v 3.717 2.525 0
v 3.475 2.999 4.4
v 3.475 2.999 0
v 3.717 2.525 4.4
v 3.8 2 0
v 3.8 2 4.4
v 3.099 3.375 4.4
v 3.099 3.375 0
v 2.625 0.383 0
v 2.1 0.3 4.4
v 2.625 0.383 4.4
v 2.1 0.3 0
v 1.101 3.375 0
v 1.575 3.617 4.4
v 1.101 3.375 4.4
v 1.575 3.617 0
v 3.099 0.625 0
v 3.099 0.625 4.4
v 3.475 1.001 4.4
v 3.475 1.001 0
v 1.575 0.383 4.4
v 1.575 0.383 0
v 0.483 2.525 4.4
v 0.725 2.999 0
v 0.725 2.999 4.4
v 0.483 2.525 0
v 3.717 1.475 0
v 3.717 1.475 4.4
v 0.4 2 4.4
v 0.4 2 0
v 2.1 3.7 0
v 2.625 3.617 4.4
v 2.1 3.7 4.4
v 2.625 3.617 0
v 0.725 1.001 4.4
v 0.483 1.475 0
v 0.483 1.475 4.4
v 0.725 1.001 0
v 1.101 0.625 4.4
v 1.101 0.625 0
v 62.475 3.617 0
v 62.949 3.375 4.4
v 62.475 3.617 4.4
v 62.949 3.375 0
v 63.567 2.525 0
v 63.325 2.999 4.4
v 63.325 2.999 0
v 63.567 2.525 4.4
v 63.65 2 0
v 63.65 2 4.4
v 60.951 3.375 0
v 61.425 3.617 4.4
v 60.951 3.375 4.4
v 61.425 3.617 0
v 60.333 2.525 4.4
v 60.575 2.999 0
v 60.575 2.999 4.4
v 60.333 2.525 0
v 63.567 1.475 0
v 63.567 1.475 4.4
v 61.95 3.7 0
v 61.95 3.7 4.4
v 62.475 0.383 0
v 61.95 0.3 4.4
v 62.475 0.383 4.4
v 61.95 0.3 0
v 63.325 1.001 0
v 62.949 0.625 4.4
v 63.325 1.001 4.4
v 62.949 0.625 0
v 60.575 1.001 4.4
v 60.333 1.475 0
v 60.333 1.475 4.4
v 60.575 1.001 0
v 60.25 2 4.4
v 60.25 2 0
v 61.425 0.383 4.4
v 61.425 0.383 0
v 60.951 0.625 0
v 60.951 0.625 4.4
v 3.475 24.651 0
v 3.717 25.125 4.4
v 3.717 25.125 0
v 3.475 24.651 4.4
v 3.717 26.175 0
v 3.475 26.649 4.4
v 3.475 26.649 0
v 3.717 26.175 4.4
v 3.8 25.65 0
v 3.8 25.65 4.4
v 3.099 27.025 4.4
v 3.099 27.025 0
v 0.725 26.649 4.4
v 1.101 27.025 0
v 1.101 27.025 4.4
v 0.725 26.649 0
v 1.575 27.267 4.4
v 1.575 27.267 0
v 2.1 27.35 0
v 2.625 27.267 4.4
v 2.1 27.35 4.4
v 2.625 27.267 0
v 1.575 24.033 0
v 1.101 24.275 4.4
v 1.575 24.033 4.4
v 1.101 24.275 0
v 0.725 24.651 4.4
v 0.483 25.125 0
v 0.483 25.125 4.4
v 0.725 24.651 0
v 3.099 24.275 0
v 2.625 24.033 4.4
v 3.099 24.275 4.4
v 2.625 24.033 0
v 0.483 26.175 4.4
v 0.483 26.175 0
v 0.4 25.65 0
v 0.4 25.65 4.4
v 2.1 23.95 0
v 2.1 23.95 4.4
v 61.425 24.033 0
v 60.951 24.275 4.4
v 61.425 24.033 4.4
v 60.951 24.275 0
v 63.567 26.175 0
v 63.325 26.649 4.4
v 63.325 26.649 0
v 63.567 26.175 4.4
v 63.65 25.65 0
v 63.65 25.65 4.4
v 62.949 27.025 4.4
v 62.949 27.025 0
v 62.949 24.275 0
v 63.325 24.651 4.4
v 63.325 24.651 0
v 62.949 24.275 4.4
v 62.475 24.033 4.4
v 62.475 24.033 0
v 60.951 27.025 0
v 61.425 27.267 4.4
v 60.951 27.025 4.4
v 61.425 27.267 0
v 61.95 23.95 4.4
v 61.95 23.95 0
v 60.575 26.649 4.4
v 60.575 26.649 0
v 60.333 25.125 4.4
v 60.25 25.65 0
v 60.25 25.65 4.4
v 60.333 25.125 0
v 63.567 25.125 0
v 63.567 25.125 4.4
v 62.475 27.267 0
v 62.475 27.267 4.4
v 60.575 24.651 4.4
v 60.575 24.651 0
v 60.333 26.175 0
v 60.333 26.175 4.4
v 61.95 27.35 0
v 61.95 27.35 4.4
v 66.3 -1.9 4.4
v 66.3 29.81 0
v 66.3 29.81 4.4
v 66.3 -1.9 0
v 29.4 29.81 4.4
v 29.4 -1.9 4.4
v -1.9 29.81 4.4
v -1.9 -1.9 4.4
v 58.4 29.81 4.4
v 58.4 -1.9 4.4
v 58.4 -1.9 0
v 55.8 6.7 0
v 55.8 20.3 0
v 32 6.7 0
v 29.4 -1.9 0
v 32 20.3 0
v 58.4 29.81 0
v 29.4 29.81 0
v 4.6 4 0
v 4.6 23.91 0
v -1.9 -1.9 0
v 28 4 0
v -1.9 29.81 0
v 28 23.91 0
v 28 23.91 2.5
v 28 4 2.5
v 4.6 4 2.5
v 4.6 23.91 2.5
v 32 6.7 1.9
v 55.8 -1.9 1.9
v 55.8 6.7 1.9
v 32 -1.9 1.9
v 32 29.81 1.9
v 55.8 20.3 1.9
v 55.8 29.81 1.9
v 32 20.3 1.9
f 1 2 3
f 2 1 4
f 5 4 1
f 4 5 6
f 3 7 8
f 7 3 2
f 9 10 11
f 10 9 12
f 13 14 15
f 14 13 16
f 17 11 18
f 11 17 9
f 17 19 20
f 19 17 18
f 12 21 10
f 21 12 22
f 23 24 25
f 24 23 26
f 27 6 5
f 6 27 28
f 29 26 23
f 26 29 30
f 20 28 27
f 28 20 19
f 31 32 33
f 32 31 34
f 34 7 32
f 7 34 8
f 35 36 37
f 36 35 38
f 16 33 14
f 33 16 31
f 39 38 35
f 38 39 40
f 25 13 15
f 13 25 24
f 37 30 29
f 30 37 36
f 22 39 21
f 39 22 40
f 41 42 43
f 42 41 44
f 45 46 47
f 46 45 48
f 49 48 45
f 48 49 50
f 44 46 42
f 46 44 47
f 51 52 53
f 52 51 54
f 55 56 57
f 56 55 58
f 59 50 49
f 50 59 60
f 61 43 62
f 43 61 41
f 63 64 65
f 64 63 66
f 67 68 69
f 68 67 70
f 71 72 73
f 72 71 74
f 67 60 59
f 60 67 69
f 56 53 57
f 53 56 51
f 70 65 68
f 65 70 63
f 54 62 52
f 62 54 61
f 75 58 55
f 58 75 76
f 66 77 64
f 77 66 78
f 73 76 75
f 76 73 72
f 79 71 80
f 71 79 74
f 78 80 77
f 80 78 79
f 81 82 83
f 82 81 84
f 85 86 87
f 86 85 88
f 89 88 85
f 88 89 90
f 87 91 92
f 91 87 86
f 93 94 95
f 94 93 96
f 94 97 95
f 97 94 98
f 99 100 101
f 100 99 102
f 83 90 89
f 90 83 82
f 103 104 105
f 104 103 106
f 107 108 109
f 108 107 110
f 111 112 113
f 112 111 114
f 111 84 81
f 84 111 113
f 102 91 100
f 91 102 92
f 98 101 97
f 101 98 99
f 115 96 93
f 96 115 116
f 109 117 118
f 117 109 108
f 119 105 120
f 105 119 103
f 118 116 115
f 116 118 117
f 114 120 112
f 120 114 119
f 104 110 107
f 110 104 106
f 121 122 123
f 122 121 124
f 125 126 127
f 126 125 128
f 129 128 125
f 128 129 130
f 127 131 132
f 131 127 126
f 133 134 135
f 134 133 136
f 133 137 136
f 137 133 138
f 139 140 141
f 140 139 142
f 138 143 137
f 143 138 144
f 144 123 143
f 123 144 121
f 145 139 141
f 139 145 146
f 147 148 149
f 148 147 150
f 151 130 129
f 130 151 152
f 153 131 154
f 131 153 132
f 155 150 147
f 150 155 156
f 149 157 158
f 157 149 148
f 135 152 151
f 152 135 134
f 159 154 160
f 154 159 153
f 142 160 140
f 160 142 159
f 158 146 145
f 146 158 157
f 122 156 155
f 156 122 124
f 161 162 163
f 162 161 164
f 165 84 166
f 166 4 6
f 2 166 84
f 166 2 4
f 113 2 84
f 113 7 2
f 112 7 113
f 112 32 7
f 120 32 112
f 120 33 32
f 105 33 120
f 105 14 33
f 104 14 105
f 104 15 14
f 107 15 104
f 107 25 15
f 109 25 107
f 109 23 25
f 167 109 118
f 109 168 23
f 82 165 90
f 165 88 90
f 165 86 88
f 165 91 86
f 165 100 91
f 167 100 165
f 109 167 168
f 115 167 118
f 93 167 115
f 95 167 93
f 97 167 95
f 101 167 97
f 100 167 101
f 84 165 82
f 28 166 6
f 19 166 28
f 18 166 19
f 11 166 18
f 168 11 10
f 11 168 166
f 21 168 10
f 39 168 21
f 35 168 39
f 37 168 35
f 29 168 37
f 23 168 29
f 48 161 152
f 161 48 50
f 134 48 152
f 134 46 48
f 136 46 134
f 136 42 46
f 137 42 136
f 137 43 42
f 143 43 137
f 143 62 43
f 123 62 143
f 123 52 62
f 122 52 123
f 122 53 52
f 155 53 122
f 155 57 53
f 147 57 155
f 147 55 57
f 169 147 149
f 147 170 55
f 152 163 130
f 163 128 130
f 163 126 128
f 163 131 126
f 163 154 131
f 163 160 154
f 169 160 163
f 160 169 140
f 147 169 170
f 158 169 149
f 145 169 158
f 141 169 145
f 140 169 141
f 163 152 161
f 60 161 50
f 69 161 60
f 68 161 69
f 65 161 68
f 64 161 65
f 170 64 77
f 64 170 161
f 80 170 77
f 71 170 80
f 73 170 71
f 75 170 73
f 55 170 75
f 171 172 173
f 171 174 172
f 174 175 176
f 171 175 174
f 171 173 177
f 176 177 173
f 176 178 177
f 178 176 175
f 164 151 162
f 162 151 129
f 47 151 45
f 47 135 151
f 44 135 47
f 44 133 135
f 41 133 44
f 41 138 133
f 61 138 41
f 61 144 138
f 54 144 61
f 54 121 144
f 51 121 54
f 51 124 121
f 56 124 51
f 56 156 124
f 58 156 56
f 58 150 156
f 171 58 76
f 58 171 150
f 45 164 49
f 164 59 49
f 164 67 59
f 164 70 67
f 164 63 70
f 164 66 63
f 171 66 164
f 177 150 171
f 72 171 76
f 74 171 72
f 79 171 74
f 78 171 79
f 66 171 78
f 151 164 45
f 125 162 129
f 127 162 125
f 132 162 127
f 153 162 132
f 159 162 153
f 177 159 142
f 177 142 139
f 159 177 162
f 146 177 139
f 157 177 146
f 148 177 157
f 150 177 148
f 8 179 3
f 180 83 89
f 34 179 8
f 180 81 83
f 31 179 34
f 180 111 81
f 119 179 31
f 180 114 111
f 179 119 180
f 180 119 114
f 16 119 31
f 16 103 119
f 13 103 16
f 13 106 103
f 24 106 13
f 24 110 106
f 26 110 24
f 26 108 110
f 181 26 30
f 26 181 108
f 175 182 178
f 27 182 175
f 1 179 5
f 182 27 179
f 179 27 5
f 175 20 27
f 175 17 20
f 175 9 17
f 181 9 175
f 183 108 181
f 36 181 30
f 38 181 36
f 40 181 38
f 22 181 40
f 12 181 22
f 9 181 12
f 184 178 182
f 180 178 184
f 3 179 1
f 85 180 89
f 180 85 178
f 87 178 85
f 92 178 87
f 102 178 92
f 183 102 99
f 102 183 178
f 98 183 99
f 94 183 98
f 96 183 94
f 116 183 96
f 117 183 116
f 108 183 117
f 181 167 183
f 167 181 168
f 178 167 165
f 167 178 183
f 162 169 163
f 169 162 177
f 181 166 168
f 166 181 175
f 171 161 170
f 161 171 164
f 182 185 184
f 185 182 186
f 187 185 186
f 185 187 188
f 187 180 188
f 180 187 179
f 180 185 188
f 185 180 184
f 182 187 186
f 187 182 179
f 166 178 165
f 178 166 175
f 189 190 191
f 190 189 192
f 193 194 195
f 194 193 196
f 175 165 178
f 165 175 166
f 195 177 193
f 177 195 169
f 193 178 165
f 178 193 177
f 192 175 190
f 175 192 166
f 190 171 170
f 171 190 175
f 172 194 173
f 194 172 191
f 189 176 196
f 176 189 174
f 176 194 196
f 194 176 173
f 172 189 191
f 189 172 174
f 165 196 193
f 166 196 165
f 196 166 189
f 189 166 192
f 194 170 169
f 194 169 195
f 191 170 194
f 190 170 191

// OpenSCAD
// Customizer Variables

// Distance from bottom of PCB to start of OLED hole
lcd_hole_y_offset = 8.6; // [3.0:0.1:13.0]

// Which part would you like to see?
part = "lid"; // [lid:Case Lid,base:Case Base]


print_part();

module print_part() {
    // This is just some boilerplate code to force the Thingiverse Customizer to generate both STLs.

    if (part == "lid") {
        print_lid();
    } else {
        // part == base
        print_base();
    }
}


module print_lid() {
    /* This module is an exact copy of the "Case Lid" OpenSCAD file. It has been replicated here to enable use of the
    Thingiverse Customizer */
    
    // Other things that I measured when designing this
    pcb_width = 64.2+0.2;
    pcb_depth = 27.41+0.5;

    // 59.7+0.25;
    post_offset_x = 59.6+0.25;
    post_offset_y = 23.4+0.25;

    wall_thickness = 1.9;
    inside_area_depth = 2.5;

    lcd_hole_width = 23.8;
    lcd_hole_height = 13.6;
    slope_width=2.6;
    slope_height=inside_area_depth;

    module make_holes() {
        post_height = 8;
        hole_radius = 1.7;
        translate([0, 0, 0]) cylinder($fn=20, r=hole_radius,h=post_height);
        translate([post_offset_x, 0, 0]) cylinder($fn=20, r=hole_radius,h=post_height);
        translate([0, post_offset_y, 0]) cylinder($fn=20, r=hole_radius,h=post_height);
        translate([post_offset_x, post_offset_y, 0]) cylinder($fn=20, r=hole_radius,h=post_height);
    }


    module prism(l, w, h) {
           polyhedron(points=[
                   [0,0,h],           // 0    front top corner
                   [0,0,0],[w,0,0],   // 1, 2 front left & right bottom corners
                   [0,l,h],           // 3    back top corner
                   [0,l,0],[w,l,0]    // 4, 5 back left & right bottom corners
           ], faces=[ // points for all faces must be ordered clockwise when looking in
                   [0,2,1],    // top face
                   [3,4,5],    // base face
                   [0,1,4,3],  // h face
                   [1,2,5,4],  // w face
                   [0,3,5,2],  // hypotenuse face
           ]);
    }

    module make_LCD_carving() {
        overall_carveout_width = slope_width*2+lcd_hole_width;

        difference() {
            // The base cube
            cube([overall_carveout_width,pcb_depth+(wall_thickness*2),wall_thickness]);

            // The LCD Screen Hole (originally 8.6)
            translate([slope_width, lcd_hole_y_offset, -0.1]) cube([lcd_hole_width,lcd_hole_height,wall_thickness*2]);
        }

        // The left slope
        translate([0,0,wall_thickness]) prism(pcb_depth+wall_thickness*2,slope_width,slope_height);
        // The right slope
        translate([slope_width*2+lcd_hole_width,pcb_depth+wall_thickness*2,wall_thickness]) rotate([0,0,180]) prism(pcb_depth+wall_thickness*2,slope_width,slope_height);
    }



    difference () {
        // The actual outside "shell"
        translate([-wall_thickness,-wall_thickness,0]) 
            cube([pcb_width+(wall_thickness*2),
                pcb_depth+(wall_thickness * 2),
                wall_thickness+inside_area_depth]);

        // The "void" for the PCB to fit into
        translate([4.6,4,-0.1]) cube([23.4, pcb_depth-8, inside_area_depth+0.1]);

        // The screw holes
        translate([2.1,2,-1.1]) make_holes();
        
        // The LCD carving area
        translate([32-slope_width,-wall_thickness-0.1, -0.1]) cube([slope_width*2+lcd_hole_width, pcb_depth+(wall_thickness*2)+0.2, wall_thickness+inside_area_depth+0.2]);
    }

    translate([32-slope_width,-wall_thickness,0]) make_LCD_carving();
}


module print_base() {
    /* This module is an exact copy of the "Case Base" OpenSCAD file. It has been replicated here to enable use of the
    Thingiverse Customizer */

    wall_thickness = 1.9;

    // Related to the "nut slot" posts
    nut_width = 5.5;
    nut_height = 2.5;
    nut_post_width = nut_width + 2.3;
    nut_hole_height = nut_height + 1.2;
    nut_hole_width = nut_width + 0.4;

    nut_hole_depth = (nut_post_width-nut_width)/2 + nut_width;

    nut_post_height = nut_hole_height + 2;




    // The actual case interior
    pcb_width = 64.2+0.2;
    pcb_depth = 27.41+0.5;

    post_offset_x = 59.6+0.25;
    post_offset_y = 23.4+0.25;
    //interior_standoff = 2.9+nut_post_height;
    interior_standoff = 1.2+nut_post_height;

    main_case_height = interior_standoff + 3.4; // The external height of the case 


    module make_nut_post(holes=true) {
        translate([-nut_post_width/2, -nut_post_width/2,0])
        difference () {
            // The actual post
            cube([nut_post_width, nut_post_width, nut_post_height]);
            if(holes) {
                // The hole for the nut
                translate([(nut_post_width-nut_hole_width)/2, -wall_thickness, (nut_post_height-nut_hole_height)/2]) cube([nut_hole_width, nut_post_width, nut_hole_height]);
            }
        }    
    }


    module make_nut_posts(holes=true) {
        translate([2.1,2,-wall_thickness]) {
            translate([0, 0, 0]) make_nut_post(holes);
            translate([post_offset_x, 0, 0]) make_nut_post(holes);
            translate([0, post_offset_y, 0]) rotate([0,0,180]) make_nut_post(holes);
            translate([post_offset_x, post_offset_y, 0]) rotate([0,0,180]) make_nut_post(holes);
        }
    }


    module make_holes() {
        post_height = main_case_height*2;
        hole_radius = 1.7;
        translate([0, 0, 0]) cylinder($fn=20, r=hole_radius,h=post_height);
        translate([post_offset_x, 0, 0]) cylinder($fn=20, r=hole_radius,h=post_height);
        translate([0, post_offset_y, 0]) cylinder($fn=20, r=hole_radius,h=post_height);
        translate([post_offset_x, post_offset_y, 0]) cylinder($fn=20, r=hole_radius,h=post_height);
    }

    difference() {
        make_nut_posts();
        translate([2.1,2,-wall_thickness-0.1]) make_holes();
    }

    difference () {
        translate([-wall_thickness,-wall_thickness,-wall_thickness]) cube([pcb_width+(wall_thickness*2),pcb_depth+(wall_thickness*2)-0.26,main_case_height+wall_thickness]);
        cube([pcb_width,pcb_depth,main_case_height+wall_thickness]);
        // The screw holes
        translate([2.1,2,-wall_thickness-0.1]) make_holes();
        // Boot switch hole
        translate([pcb_width-1.6-2,7.6,-wall_thickness-0.1]) cube([2,2,7+wall_thickness]);
        // microUSB hole
        translate([pcb_width-0.1,13.7,interior_standoff-3]) cube([wall_thickness+0.2,9,4]);
        
        #make_nut_posts(false);
        
    }

    translate([5.2,0,0]) cube([22.9, 1.6, interior_standoff]);
    translate([5.2,pcb_depth-1.6,0]) cube([37.4, 1.6, interior_standoff]);
    translate([22,0,0]) cube([1,pcb_depth,interior_standoff]);
    translate([54,0,0]) cube([4,1.6,interior_standoff]);

    
}
